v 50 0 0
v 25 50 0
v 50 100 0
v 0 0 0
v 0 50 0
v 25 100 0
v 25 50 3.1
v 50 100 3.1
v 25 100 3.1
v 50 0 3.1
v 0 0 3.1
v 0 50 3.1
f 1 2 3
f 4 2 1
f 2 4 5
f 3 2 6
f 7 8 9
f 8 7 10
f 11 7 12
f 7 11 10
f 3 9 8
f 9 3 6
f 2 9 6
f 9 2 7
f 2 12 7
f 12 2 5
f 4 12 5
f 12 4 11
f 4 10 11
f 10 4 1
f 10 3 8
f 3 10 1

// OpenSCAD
include <../lasercut.scad>; 

thickness = 3.1;
x = 50;
y = 100;
points = [[0,0], [x,0], [x,y], [x/2,y], [x/2,y/2], [0,y/2], [0,0]];
lasercutout(thickness=thickness, points = points);
